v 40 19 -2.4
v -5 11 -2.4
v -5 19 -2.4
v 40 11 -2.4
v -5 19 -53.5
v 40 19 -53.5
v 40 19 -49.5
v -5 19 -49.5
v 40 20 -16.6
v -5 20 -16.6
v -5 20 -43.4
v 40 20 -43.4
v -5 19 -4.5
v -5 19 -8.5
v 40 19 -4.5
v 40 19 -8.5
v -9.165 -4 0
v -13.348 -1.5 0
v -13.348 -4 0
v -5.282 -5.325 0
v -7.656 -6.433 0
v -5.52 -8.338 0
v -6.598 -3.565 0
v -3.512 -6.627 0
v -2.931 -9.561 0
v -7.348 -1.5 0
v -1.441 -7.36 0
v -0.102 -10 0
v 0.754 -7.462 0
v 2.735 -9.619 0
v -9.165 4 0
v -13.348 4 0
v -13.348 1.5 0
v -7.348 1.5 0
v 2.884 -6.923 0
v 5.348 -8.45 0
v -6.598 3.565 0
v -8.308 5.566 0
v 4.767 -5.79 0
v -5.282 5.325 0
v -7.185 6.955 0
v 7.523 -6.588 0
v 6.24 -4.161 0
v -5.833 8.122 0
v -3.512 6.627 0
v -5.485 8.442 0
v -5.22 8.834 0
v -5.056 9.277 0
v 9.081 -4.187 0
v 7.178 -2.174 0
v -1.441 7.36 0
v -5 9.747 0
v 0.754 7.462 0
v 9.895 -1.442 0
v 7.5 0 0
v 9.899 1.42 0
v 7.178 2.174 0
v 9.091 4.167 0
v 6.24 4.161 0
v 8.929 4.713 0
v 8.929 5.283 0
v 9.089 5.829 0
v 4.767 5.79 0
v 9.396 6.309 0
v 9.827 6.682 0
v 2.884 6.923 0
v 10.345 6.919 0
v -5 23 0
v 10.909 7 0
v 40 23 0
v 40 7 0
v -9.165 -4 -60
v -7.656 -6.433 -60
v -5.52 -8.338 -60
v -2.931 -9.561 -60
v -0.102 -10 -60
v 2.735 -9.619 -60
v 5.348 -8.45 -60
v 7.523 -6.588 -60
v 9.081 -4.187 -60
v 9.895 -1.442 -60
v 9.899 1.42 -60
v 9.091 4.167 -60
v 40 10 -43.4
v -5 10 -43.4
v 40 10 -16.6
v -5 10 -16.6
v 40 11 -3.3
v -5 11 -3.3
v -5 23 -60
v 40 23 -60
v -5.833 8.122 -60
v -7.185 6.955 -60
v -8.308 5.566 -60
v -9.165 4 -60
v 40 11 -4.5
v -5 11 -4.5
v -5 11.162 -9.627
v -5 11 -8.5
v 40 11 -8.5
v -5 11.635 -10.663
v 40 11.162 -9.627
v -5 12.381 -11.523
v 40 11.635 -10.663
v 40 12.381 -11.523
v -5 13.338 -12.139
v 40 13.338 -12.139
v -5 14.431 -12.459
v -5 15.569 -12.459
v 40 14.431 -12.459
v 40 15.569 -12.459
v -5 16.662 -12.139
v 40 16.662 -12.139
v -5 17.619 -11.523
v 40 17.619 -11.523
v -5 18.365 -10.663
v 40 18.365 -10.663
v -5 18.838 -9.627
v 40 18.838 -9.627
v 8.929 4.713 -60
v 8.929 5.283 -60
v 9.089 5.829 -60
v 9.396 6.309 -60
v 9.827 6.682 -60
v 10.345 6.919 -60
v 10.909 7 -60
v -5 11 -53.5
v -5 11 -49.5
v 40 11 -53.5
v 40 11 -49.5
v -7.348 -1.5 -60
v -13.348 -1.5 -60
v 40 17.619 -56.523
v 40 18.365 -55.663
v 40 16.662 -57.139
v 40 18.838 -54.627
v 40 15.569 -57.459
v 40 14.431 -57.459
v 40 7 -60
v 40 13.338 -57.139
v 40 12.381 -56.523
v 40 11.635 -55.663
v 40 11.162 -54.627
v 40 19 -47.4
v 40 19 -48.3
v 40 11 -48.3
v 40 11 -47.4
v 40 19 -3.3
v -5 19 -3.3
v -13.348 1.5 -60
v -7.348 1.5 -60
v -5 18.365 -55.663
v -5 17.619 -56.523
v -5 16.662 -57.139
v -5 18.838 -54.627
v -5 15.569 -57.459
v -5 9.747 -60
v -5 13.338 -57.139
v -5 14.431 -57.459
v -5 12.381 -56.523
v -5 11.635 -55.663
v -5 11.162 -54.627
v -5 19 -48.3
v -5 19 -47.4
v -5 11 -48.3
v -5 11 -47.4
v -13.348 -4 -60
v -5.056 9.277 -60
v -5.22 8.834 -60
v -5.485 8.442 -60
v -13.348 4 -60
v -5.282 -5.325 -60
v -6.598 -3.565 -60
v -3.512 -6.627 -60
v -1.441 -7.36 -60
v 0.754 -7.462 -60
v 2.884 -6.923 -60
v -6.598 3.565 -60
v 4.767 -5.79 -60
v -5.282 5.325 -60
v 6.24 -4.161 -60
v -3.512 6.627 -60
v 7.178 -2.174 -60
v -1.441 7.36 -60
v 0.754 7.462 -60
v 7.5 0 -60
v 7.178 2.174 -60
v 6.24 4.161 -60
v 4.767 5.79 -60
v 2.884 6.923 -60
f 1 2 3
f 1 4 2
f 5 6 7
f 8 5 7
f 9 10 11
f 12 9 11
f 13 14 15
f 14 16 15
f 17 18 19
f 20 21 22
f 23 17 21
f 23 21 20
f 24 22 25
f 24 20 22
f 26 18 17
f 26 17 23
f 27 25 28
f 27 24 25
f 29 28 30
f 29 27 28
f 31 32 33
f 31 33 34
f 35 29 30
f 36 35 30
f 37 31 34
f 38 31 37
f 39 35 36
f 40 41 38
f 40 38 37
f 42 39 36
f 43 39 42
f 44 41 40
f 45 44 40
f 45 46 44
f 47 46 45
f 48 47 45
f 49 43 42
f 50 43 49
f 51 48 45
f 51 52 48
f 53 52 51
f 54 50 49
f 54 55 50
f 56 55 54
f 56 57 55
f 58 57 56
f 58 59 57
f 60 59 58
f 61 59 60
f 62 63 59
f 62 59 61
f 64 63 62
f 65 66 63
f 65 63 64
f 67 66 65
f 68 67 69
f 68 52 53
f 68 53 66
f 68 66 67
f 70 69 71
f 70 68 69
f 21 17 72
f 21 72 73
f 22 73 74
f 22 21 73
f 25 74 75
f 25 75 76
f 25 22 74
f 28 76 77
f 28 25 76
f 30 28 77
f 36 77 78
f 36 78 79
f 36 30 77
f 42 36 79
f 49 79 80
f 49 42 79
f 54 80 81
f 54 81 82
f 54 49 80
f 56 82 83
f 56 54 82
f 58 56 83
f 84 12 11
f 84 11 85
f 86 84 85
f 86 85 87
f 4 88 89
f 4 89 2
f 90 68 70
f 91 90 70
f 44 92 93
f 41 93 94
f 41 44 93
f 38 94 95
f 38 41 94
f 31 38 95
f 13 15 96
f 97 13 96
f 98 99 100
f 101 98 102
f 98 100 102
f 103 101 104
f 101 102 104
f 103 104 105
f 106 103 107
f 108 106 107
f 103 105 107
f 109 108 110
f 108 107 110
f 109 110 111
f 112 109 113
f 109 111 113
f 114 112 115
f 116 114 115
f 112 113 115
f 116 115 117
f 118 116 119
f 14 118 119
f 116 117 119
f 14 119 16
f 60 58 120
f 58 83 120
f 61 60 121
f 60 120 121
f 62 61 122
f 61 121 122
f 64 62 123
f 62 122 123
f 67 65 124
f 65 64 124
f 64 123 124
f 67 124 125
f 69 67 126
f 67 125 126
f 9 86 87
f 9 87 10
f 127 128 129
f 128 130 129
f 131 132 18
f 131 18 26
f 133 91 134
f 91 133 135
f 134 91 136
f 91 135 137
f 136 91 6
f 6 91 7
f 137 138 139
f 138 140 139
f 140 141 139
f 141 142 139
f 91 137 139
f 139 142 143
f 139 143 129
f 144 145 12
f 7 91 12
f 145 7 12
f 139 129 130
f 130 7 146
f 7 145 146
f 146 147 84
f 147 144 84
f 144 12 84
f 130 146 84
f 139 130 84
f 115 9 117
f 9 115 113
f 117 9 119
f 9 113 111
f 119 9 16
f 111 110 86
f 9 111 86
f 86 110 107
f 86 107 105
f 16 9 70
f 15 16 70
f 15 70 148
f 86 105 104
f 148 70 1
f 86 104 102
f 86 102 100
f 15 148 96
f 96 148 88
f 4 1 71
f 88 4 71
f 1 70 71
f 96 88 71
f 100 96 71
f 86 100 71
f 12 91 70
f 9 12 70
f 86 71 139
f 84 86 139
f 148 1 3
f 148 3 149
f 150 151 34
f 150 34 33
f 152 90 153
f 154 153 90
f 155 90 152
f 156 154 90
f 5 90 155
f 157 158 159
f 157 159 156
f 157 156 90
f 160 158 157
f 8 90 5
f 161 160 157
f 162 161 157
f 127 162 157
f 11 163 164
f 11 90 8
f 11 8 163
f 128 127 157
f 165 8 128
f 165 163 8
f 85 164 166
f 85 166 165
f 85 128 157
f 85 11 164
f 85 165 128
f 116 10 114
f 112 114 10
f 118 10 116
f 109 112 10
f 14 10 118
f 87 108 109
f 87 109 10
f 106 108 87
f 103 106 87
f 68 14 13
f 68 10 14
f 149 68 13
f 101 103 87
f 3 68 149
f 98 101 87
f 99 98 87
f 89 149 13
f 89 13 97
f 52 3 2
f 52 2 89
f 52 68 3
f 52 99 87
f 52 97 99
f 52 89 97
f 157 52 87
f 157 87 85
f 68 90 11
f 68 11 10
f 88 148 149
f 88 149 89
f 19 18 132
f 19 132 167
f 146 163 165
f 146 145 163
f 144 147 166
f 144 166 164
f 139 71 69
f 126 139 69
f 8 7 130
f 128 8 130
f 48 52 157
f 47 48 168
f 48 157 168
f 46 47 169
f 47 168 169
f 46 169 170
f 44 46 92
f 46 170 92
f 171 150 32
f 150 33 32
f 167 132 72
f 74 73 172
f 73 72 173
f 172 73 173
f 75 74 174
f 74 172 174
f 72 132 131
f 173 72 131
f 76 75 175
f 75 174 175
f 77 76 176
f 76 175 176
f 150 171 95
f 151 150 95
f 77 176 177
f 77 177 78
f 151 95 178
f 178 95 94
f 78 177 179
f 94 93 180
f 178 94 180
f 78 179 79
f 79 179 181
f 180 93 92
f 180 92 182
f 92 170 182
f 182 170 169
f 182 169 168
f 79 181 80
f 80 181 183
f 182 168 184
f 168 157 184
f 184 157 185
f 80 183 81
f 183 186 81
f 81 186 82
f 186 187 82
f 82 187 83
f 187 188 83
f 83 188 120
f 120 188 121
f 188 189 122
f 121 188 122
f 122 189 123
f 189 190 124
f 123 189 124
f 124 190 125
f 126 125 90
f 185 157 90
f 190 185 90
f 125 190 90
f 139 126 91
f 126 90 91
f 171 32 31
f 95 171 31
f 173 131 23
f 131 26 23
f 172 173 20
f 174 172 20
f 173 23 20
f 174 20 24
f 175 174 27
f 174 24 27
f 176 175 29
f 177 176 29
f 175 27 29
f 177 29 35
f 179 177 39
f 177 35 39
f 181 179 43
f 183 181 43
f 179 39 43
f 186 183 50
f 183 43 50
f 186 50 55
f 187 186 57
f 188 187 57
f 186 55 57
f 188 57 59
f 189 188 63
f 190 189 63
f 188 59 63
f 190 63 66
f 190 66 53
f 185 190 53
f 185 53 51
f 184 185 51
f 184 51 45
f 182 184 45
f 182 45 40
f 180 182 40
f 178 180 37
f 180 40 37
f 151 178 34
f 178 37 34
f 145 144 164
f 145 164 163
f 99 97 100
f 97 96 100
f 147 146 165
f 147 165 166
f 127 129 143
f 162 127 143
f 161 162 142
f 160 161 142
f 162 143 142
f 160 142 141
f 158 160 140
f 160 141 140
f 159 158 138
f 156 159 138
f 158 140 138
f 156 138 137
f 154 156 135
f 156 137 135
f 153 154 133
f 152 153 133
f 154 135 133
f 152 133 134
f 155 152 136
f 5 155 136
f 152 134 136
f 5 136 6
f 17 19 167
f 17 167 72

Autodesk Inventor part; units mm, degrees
ref_plane "YZ Plane" through (0, 0, 0) normal (1, 0, 0) x (0, 1, 0)
ref_plane "XZ Plane" through (0, 0, 0) normal (0, 1, 0) x (-1, 0, 0)
sketch "Sketch2" plane through (0, 0, 0) normal (0, 0, 1) x (1, 0, 0)
  line L0 (0, 0) -> (25, 0) construction
  circle A0 centre (0, 0) radius 7.5 construction
  line L1 (15.1273, 0) -> (20.0637, 8.55) construction
  line L2 (20.0637, 8.55) -> (29.9363, 8.55) construction
  line L3 (29.9363, 8.55) -> (34.8727, 0) construction
  line L4 (34.8727, 0) -> (29.9363, -8.55) construction
  line L5 (29.9363, -8.55) -> (20.0637, -8.55) construction
  line L6 (20.0637, -8.55) -> (15.1273, 0) construction
  line L7 (0, 0) -> (0, 26) construction
  line L8 (0, 26) -> (25, 26) construction
  line L9 (-7.3485, 1.5) -> (-13.3485, 1.5)
  line L10 (-13.3485, 1.5) -> (-13.3485, -1.5) construction
  line L11 (-13.3485, -1.5) -> (-7.3485, -1.5)
  line L12 (-13.3485, -1.5) -> (-13.3485, -4)
  line L13 (-13.3485, 1.5) -> (-13.3485, 4)
  line L14 (-5, 23) -> (-5, 8.6603)
  arc A1 (-5, 8.6603) -> (-9.1652, 4) centre (0, 0) ccw
  line L15 (-13.3485, 4) -> (-9.1652, 4)
  line L16 (-13.3485, -4) -> (-9.1652, -4)
  arc A2 (-9.1652, 4) -> (-9.1652, -4) centre (0, 0) ccw construction
  arc A3 (-9.1652, -4) -> (7.1414, 7) centre (0, 0) ccw
  line L17 (-5, 23) -> (40, 23)
  arc A4 (-7.3485, -1.5) -> (-7.3485, 1.5) centre (0, 0) ccw
  circle A5 centre (25, 0) radius 5 construction
  circle A6 centre (25, 0) radius 6 construction
  line L18 (40, 23) -> (40, 7)
  line L19 (40, 7) -> (7.1414, 7)
  line L20 (40, 15) -> (-5, 15) construction
  line L21 (40, 19) -> (-5, 19) construction
  line L22 (-5, 11) -> (40, 11) construction
  dimension "d32" = 25
  dimension "d33" = 15
  dimension "d34" = 17.1
  dimension "d35" = 26
  dimension "d36" = 6
  dimension "d37" = 2.5
  dimension "d38" = 3
  dimension "d39" = 2.5
  dimension "d40" = 3
  dimension "d41" = 10
  dimension "d42" = 1
  dimension "d43" = 16
  dimension "d44" = 8
  dimension "d45" = 5
  dimension "d46" = 45
extrude "Extrusion6" add sketch "Sketch2" against normal blind 60
fillet "Fillet1" radius 2 2 edges at (7.1414, 7, -30) (-5, 8.6603, -30)
ref_plane "Work Plane1" through (0, 0, -30) normal (0, 0, 1) x (1, 0, 0)
sketch "Sketch4" plane through (40, 7, 0) normal (1, 0, 0) x (0, 0, -1)
  line L0 (0, 16) -> (0, 0) projected
  line L1 (60, 16) -> (60, 0) projected
  line L2 (0, 8) -> (60, 8) construction
  circle A0 centre (8.5, 8) radius 4
  line L3 (4.5, 4) -> (8.5, 4)
  line L4 (8.5, 4) -> (8.5, 12)
  line L5 (8.5, 12) -> (4.5, 12)
  line L6 (4.5, 12) -> (4.5, 4)
  line L7 (4.5, 4) -> (8.5, 12) construction
  line L8 (8.5, 4) -> (4.5, 12) construction
  line L9 (3.3, 4) -> (2.4, 4)
  line L10 (2.4, 4) -> (2.4, 12)
  line L11 (2.4, 12) -> (3.3, 12)
  line L12 (3.3, 12) -> (3.3, 4)
  line L13 (3.3, 4) -> (2.4, 12) construction
  line L14 (2.4, 4) -> (3.3, 12) construction
  circle A1 centre (53.5, 8) radius 4
  line L15 (49.5, 4) -> (53.5, 4)
  line L16 (53.5, 4) -> (53.5, 12)
  line L17 (53.5, 12) -> (49.5, 12)
  line L18 (49.5, 12) -> (49.5, 4)
  line L19 (49.5, 4) -> (53.5, 12) construction
  line L20 (53.5, 4) -> (49.5, 12) construction
  line L21 (48.3, 4) -> (47.4, 4)
  line L22 (47.4, 4) -> (47.4, 12)
  line L23 (47.4, 12) -> (48.3, 12)
  line L24 (48.3, 12) -> (48.3, 4)
  line L25 (48.3, 4) -> (47.4, 12) construction
  line L26 (47.4, 4) -> (48.3, 12) construction
  line L27 (43.4, 3) -> (16.6, 3)
  line L28 (16.6, 3) -> (16.6, 13)
  line L29 (16.6, 13) -> (43.4, 13)
  line L30 (43.4, 13) -> (43.4, 3)
  line L31 (43.4, 3) -> (16.6, 13) construction
  line L32 (16.6, 3) -> (43.4, 13) construction
  line L33 (47.4, 8) -> (43.4, 8) construction
  line L34 (12.5, 8) -> (16.6, 8) construction
  point P0 (0, -7)
  point P1 (6.5, 8)
  point P2 (2.85, 8)
  point P3 (51.5, 8)
  point P4 (47.85, 8)
  point P5 (30, 8)
  dimension "d52" = 8
  dimension "d53" = 0.9
  dimension "d54" = 1.2
  dimension "d55" = 2.4
  dimension "d58" = 45
  dimension "d63" = 10
  dimension "d65" = 4
extrude "Extrusion7" cut sketch "Sketch4" against normal up to next
properties part number "X_base"
